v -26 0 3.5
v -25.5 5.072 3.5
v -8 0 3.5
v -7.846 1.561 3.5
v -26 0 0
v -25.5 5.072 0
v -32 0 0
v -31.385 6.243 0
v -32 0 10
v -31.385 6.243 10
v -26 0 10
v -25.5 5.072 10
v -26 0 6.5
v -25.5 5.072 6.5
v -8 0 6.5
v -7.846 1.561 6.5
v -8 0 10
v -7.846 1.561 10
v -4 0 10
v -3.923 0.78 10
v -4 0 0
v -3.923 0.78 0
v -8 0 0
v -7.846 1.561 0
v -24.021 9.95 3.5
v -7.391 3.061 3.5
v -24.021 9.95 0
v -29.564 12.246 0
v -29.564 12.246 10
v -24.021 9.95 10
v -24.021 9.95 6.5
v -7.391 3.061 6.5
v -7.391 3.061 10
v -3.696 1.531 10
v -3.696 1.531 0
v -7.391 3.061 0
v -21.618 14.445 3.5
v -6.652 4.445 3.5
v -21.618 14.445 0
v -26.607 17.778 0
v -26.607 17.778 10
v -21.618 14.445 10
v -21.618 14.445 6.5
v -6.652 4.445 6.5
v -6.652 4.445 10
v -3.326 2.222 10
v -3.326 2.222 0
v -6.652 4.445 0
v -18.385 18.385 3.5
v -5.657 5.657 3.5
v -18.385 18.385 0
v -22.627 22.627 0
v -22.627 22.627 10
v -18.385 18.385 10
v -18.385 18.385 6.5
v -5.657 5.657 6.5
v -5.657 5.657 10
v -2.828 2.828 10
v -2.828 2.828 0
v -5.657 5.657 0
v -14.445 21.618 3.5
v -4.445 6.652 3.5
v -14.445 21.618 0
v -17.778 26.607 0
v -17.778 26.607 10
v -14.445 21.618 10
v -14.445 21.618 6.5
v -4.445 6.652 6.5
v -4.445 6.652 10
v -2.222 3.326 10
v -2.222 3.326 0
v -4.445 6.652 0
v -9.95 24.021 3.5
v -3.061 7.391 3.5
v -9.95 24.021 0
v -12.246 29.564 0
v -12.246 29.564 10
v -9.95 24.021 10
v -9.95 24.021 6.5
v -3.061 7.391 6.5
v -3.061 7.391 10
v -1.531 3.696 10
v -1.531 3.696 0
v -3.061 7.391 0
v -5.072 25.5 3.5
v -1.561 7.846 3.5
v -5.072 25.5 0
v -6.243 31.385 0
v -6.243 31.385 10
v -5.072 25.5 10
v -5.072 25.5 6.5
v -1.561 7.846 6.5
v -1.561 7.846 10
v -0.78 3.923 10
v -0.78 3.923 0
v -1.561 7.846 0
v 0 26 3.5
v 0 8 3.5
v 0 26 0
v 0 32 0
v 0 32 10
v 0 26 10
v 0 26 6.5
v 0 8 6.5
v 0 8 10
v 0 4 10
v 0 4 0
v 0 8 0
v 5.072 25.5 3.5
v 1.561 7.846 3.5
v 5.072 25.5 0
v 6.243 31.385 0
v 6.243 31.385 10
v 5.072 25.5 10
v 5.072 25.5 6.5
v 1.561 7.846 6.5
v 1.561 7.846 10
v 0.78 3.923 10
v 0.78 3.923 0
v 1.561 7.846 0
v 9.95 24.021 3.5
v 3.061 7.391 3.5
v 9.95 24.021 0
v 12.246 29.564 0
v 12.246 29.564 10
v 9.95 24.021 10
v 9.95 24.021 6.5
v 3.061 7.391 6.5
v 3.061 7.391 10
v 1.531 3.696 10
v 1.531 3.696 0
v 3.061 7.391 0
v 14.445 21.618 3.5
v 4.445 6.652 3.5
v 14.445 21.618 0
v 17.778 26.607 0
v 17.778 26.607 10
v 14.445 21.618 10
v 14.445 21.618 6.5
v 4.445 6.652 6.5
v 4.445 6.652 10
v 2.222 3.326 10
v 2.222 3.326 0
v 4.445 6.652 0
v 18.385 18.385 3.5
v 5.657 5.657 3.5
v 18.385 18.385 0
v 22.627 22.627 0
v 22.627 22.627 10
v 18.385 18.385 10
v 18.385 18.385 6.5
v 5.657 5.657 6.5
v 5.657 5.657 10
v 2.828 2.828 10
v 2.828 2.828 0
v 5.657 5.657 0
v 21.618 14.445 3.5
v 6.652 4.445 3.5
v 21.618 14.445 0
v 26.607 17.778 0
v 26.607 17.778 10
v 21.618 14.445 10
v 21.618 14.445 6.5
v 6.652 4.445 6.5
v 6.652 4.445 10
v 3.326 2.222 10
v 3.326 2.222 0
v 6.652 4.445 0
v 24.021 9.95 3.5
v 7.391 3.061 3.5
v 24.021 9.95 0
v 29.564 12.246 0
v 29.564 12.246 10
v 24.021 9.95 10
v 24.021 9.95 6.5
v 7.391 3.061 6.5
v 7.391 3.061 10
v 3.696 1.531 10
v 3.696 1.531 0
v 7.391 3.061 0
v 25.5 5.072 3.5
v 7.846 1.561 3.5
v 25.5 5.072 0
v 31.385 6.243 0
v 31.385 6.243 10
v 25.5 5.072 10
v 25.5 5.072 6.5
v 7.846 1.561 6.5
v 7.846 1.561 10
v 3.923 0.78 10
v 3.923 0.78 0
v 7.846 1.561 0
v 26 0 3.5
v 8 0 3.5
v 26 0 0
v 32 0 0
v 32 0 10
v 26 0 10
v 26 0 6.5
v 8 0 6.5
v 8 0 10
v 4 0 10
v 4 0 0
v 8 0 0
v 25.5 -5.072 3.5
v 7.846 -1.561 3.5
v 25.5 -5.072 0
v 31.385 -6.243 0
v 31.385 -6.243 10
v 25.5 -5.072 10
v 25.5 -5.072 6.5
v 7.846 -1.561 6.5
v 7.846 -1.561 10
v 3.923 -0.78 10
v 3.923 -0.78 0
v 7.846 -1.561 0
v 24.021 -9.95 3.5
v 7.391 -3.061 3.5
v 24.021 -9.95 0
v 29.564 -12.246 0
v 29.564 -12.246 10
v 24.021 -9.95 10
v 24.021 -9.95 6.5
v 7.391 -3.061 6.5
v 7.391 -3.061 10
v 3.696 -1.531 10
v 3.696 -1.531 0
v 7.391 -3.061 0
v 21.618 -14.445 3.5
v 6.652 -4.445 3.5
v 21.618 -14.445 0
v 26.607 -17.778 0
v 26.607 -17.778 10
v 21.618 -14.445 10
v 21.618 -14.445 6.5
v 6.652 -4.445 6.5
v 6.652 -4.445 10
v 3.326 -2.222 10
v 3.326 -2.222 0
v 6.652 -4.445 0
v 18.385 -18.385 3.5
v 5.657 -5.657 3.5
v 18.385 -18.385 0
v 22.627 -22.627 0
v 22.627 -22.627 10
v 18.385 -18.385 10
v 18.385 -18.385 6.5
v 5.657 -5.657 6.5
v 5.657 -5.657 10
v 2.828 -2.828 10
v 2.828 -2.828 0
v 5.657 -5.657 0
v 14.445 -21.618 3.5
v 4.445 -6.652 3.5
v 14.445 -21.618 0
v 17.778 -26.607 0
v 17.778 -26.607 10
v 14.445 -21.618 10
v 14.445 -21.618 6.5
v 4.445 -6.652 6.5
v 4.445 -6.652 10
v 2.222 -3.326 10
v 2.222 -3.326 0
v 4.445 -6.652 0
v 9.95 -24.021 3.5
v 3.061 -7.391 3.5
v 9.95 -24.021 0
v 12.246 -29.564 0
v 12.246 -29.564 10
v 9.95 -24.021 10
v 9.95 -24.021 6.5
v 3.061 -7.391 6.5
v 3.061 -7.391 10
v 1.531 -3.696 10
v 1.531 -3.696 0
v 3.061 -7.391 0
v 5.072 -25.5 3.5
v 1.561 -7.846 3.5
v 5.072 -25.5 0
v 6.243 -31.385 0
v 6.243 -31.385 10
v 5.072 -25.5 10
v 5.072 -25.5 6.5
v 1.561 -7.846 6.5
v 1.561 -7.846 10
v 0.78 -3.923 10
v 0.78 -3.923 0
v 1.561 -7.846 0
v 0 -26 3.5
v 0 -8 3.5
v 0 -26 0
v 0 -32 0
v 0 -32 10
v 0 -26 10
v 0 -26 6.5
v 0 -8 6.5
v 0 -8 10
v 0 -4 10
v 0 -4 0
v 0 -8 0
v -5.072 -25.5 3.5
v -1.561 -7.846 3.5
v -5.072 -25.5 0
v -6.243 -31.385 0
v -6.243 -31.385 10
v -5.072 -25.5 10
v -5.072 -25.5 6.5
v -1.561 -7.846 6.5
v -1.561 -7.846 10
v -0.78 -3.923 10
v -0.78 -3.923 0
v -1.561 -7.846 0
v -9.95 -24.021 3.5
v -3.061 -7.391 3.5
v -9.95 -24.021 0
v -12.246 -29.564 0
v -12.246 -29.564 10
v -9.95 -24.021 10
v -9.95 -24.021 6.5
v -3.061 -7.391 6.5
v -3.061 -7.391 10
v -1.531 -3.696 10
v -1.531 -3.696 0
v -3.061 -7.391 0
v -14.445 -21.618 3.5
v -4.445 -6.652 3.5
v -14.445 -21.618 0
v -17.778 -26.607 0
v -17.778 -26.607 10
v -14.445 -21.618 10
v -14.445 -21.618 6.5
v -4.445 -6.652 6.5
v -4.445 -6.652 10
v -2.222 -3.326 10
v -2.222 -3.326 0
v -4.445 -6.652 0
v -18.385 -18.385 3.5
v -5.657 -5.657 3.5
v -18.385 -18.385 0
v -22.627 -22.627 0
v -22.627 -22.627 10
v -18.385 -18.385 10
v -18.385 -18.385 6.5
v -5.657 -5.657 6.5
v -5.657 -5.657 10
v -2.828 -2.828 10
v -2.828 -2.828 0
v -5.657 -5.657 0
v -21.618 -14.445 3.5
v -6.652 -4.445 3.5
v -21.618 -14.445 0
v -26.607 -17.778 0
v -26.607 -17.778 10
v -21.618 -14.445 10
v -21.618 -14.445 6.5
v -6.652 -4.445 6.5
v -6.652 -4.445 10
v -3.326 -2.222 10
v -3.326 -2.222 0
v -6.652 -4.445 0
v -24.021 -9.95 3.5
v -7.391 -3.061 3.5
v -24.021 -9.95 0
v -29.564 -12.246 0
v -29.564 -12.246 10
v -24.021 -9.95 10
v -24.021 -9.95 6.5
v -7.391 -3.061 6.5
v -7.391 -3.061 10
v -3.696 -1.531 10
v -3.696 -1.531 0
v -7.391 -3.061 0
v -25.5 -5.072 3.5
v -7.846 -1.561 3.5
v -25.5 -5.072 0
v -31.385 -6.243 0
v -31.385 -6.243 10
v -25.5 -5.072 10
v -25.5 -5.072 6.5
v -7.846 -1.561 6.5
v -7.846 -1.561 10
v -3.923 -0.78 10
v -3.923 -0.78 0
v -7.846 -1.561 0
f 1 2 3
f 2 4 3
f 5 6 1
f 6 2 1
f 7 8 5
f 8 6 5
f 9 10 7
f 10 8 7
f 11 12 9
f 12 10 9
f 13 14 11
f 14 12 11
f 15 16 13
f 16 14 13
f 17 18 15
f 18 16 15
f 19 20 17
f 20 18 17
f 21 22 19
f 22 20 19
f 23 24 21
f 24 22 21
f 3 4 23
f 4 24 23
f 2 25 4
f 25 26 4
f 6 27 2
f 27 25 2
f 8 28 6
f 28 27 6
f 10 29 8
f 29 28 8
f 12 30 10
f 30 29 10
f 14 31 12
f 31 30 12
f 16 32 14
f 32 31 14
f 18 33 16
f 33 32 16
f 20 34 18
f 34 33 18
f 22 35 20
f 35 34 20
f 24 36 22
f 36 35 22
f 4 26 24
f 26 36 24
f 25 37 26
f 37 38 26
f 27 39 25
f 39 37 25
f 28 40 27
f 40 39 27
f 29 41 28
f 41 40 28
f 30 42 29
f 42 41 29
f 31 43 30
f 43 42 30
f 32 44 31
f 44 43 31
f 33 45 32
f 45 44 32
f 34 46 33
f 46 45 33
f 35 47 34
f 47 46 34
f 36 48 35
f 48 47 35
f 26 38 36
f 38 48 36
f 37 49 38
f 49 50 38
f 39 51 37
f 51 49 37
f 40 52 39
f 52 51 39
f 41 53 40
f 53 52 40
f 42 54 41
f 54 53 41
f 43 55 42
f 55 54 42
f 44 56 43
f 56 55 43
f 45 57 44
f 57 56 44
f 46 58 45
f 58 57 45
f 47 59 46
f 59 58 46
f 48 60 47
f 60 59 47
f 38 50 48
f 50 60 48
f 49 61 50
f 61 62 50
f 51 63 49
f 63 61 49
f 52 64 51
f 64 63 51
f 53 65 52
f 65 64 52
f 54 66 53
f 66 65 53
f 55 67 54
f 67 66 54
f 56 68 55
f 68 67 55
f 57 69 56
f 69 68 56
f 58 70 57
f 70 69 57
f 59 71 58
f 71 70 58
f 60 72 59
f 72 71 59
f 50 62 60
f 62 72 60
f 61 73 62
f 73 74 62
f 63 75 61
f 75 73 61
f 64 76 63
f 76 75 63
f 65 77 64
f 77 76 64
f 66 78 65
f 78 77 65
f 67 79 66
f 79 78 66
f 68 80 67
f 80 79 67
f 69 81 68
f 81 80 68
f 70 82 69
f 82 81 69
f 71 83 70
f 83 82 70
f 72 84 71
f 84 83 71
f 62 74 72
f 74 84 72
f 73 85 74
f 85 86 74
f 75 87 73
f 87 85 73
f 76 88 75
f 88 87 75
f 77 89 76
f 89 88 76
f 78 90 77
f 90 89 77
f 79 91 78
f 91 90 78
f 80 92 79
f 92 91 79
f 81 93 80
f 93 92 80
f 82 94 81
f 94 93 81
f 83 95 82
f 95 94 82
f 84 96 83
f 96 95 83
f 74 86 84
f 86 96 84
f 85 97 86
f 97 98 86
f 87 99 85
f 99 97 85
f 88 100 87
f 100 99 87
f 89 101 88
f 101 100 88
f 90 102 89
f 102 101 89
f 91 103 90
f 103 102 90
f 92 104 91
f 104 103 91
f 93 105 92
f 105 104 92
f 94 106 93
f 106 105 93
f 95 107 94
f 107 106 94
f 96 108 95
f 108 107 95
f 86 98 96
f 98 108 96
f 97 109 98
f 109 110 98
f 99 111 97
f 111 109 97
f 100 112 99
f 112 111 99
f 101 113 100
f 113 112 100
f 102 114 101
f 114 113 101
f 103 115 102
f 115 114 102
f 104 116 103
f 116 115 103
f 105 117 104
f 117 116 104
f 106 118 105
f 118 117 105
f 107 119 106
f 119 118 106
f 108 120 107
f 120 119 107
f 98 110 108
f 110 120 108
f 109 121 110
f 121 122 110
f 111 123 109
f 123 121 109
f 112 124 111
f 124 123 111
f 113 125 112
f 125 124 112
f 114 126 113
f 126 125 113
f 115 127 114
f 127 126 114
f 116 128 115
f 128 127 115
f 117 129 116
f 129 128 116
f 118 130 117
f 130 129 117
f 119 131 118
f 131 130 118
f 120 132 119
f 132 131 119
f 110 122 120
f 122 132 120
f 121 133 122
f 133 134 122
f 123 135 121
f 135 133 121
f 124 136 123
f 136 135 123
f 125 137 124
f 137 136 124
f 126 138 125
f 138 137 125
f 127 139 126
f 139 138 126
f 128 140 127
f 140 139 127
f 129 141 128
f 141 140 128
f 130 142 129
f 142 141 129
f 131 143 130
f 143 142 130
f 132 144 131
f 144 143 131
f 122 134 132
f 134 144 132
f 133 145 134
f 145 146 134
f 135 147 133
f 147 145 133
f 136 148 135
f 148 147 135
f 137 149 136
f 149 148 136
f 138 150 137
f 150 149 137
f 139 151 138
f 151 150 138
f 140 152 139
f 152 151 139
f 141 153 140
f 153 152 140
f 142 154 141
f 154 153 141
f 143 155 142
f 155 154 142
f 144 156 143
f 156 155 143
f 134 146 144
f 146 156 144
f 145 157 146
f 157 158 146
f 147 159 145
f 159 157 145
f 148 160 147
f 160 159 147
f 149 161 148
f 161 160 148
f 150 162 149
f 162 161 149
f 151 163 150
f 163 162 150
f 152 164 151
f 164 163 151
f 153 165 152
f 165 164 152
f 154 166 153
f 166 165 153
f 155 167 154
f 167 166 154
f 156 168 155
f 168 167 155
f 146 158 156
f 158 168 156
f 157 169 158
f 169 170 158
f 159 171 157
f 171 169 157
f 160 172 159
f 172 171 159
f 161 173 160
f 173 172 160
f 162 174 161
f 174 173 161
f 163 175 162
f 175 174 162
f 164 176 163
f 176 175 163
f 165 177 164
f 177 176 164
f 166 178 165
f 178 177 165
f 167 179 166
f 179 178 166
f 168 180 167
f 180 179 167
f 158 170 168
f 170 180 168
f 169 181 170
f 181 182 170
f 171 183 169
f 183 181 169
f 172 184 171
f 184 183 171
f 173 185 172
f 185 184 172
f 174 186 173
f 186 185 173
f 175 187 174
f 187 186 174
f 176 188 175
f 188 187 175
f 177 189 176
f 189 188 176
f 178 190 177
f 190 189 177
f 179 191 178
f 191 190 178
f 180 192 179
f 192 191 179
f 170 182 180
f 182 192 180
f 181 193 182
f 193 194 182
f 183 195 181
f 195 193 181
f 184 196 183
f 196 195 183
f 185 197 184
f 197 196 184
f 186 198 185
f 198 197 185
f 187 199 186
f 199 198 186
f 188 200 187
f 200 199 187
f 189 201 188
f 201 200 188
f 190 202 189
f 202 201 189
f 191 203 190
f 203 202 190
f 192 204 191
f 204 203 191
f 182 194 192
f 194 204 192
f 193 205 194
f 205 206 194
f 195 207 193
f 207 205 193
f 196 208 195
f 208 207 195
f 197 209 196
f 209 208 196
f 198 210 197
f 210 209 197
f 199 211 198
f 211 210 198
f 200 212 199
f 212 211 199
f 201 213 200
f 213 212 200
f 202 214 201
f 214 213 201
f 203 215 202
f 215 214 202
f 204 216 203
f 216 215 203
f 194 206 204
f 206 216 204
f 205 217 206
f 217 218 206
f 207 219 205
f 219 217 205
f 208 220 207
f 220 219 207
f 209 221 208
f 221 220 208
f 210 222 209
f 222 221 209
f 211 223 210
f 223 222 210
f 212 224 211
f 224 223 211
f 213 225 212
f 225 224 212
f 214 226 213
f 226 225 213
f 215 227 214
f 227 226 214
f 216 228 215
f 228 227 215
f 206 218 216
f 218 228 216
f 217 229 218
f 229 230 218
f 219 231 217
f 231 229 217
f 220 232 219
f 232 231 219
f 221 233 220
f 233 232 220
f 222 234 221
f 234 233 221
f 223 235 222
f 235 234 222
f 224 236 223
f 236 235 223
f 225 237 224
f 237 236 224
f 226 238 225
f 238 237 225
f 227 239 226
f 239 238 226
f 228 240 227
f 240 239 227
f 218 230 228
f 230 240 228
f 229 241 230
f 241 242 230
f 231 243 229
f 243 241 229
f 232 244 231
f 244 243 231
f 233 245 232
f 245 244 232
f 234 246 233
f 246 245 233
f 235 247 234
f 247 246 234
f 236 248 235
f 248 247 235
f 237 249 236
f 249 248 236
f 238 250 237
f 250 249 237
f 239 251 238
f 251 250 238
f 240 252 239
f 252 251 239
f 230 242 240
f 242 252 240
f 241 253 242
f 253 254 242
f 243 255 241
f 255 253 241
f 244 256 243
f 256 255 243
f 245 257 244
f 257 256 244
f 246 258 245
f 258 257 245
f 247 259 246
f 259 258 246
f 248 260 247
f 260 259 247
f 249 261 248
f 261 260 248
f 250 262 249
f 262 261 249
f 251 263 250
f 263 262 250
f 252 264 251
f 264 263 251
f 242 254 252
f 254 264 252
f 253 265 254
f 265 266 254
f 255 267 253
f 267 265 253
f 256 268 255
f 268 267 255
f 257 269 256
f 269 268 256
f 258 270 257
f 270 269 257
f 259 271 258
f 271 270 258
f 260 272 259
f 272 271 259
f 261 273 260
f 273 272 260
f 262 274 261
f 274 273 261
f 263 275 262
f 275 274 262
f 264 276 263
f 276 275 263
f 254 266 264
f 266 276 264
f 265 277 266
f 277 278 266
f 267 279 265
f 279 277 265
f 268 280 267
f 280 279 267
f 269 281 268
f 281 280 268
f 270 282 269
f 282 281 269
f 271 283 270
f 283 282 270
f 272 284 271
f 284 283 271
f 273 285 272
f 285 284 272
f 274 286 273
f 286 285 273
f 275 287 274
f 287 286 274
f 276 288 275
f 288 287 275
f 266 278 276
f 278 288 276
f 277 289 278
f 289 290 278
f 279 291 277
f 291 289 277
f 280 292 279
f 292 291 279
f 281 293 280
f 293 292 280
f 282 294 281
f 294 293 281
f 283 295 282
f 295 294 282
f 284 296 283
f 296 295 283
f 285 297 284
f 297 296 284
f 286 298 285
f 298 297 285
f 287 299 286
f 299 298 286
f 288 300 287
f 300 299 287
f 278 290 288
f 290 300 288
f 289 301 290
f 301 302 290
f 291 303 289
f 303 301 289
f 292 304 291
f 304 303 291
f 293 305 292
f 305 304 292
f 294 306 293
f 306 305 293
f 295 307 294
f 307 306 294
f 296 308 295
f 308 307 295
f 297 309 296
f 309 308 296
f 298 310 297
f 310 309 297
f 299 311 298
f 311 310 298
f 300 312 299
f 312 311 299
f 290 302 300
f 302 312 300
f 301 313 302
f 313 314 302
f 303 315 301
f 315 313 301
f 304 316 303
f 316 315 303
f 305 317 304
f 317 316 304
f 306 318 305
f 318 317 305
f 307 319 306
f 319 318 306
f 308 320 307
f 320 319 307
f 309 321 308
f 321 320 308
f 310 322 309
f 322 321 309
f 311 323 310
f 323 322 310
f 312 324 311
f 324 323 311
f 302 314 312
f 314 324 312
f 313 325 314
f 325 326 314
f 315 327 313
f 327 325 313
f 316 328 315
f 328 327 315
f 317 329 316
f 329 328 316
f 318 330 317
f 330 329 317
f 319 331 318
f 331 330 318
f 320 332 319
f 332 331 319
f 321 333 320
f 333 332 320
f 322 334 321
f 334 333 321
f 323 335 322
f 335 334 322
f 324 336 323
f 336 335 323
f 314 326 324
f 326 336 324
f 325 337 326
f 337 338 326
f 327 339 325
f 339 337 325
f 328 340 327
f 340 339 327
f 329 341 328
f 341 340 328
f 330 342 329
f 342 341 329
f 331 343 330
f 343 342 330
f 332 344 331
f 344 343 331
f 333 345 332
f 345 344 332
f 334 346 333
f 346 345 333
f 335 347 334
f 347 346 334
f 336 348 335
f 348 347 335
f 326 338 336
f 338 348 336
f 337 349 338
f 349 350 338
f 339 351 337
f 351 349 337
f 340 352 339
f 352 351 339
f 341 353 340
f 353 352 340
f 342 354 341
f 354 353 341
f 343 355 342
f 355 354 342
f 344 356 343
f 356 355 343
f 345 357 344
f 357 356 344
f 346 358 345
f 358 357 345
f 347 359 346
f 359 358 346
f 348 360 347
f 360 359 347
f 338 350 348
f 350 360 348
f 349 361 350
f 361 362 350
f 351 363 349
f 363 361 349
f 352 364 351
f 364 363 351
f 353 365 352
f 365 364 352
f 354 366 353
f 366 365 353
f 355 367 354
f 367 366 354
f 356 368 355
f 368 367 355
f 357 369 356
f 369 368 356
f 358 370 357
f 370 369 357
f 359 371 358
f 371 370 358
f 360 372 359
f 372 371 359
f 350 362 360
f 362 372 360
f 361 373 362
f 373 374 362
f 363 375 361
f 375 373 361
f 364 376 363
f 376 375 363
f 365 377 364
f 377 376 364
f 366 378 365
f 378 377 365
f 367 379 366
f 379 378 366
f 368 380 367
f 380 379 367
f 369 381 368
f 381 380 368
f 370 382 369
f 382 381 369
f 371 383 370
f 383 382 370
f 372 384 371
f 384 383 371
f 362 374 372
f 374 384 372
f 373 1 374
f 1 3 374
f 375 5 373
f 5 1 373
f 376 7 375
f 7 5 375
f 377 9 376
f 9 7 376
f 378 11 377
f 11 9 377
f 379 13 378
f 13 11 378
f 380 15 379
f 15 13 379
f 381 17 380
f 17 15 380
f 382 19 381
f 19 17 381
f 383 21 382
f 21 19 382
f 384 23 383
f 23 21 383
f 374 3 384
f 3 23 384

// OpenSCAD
$fn = 32;

// ----------------------------------------------------------------------
// Revolved part: handwheel R32
// ----------------------------------------------------------------------

// --- parameters (mm) ---
bore_r = 4;               // bore radius
rim_r = 32;               // rim radius
rim_w = 6;                // rim axial width
rim_t = 10;               // rim diameter height
hub_r = 8;                // hub radius
web_t = 3;                // web thickness
revolve_angle = 360;      // revolve sweep, degrees
fit_tol = 0.1;            // declared fit tolerance (prompt contract)
free_tol = 0.3;           // declared free tolerance (prompt contract)

bore_d = 2 * bore_r;
rim_d = 2 * rim_r;
hub_d = 2 * hub_r;

profile = [[4, 0], [8, 0], [8, 3.5], [26, 3.5], [26, 0], [32, 0], [32, 10], [26, 10], [26, 6.5], [8, 6.5], [8, 10], [4, 10]];  // primary outline, 12 points, counter clockwise

// --- the one profile operation ---
rotate_extrude(angle = revolve_angle) polygon(points = profile);
